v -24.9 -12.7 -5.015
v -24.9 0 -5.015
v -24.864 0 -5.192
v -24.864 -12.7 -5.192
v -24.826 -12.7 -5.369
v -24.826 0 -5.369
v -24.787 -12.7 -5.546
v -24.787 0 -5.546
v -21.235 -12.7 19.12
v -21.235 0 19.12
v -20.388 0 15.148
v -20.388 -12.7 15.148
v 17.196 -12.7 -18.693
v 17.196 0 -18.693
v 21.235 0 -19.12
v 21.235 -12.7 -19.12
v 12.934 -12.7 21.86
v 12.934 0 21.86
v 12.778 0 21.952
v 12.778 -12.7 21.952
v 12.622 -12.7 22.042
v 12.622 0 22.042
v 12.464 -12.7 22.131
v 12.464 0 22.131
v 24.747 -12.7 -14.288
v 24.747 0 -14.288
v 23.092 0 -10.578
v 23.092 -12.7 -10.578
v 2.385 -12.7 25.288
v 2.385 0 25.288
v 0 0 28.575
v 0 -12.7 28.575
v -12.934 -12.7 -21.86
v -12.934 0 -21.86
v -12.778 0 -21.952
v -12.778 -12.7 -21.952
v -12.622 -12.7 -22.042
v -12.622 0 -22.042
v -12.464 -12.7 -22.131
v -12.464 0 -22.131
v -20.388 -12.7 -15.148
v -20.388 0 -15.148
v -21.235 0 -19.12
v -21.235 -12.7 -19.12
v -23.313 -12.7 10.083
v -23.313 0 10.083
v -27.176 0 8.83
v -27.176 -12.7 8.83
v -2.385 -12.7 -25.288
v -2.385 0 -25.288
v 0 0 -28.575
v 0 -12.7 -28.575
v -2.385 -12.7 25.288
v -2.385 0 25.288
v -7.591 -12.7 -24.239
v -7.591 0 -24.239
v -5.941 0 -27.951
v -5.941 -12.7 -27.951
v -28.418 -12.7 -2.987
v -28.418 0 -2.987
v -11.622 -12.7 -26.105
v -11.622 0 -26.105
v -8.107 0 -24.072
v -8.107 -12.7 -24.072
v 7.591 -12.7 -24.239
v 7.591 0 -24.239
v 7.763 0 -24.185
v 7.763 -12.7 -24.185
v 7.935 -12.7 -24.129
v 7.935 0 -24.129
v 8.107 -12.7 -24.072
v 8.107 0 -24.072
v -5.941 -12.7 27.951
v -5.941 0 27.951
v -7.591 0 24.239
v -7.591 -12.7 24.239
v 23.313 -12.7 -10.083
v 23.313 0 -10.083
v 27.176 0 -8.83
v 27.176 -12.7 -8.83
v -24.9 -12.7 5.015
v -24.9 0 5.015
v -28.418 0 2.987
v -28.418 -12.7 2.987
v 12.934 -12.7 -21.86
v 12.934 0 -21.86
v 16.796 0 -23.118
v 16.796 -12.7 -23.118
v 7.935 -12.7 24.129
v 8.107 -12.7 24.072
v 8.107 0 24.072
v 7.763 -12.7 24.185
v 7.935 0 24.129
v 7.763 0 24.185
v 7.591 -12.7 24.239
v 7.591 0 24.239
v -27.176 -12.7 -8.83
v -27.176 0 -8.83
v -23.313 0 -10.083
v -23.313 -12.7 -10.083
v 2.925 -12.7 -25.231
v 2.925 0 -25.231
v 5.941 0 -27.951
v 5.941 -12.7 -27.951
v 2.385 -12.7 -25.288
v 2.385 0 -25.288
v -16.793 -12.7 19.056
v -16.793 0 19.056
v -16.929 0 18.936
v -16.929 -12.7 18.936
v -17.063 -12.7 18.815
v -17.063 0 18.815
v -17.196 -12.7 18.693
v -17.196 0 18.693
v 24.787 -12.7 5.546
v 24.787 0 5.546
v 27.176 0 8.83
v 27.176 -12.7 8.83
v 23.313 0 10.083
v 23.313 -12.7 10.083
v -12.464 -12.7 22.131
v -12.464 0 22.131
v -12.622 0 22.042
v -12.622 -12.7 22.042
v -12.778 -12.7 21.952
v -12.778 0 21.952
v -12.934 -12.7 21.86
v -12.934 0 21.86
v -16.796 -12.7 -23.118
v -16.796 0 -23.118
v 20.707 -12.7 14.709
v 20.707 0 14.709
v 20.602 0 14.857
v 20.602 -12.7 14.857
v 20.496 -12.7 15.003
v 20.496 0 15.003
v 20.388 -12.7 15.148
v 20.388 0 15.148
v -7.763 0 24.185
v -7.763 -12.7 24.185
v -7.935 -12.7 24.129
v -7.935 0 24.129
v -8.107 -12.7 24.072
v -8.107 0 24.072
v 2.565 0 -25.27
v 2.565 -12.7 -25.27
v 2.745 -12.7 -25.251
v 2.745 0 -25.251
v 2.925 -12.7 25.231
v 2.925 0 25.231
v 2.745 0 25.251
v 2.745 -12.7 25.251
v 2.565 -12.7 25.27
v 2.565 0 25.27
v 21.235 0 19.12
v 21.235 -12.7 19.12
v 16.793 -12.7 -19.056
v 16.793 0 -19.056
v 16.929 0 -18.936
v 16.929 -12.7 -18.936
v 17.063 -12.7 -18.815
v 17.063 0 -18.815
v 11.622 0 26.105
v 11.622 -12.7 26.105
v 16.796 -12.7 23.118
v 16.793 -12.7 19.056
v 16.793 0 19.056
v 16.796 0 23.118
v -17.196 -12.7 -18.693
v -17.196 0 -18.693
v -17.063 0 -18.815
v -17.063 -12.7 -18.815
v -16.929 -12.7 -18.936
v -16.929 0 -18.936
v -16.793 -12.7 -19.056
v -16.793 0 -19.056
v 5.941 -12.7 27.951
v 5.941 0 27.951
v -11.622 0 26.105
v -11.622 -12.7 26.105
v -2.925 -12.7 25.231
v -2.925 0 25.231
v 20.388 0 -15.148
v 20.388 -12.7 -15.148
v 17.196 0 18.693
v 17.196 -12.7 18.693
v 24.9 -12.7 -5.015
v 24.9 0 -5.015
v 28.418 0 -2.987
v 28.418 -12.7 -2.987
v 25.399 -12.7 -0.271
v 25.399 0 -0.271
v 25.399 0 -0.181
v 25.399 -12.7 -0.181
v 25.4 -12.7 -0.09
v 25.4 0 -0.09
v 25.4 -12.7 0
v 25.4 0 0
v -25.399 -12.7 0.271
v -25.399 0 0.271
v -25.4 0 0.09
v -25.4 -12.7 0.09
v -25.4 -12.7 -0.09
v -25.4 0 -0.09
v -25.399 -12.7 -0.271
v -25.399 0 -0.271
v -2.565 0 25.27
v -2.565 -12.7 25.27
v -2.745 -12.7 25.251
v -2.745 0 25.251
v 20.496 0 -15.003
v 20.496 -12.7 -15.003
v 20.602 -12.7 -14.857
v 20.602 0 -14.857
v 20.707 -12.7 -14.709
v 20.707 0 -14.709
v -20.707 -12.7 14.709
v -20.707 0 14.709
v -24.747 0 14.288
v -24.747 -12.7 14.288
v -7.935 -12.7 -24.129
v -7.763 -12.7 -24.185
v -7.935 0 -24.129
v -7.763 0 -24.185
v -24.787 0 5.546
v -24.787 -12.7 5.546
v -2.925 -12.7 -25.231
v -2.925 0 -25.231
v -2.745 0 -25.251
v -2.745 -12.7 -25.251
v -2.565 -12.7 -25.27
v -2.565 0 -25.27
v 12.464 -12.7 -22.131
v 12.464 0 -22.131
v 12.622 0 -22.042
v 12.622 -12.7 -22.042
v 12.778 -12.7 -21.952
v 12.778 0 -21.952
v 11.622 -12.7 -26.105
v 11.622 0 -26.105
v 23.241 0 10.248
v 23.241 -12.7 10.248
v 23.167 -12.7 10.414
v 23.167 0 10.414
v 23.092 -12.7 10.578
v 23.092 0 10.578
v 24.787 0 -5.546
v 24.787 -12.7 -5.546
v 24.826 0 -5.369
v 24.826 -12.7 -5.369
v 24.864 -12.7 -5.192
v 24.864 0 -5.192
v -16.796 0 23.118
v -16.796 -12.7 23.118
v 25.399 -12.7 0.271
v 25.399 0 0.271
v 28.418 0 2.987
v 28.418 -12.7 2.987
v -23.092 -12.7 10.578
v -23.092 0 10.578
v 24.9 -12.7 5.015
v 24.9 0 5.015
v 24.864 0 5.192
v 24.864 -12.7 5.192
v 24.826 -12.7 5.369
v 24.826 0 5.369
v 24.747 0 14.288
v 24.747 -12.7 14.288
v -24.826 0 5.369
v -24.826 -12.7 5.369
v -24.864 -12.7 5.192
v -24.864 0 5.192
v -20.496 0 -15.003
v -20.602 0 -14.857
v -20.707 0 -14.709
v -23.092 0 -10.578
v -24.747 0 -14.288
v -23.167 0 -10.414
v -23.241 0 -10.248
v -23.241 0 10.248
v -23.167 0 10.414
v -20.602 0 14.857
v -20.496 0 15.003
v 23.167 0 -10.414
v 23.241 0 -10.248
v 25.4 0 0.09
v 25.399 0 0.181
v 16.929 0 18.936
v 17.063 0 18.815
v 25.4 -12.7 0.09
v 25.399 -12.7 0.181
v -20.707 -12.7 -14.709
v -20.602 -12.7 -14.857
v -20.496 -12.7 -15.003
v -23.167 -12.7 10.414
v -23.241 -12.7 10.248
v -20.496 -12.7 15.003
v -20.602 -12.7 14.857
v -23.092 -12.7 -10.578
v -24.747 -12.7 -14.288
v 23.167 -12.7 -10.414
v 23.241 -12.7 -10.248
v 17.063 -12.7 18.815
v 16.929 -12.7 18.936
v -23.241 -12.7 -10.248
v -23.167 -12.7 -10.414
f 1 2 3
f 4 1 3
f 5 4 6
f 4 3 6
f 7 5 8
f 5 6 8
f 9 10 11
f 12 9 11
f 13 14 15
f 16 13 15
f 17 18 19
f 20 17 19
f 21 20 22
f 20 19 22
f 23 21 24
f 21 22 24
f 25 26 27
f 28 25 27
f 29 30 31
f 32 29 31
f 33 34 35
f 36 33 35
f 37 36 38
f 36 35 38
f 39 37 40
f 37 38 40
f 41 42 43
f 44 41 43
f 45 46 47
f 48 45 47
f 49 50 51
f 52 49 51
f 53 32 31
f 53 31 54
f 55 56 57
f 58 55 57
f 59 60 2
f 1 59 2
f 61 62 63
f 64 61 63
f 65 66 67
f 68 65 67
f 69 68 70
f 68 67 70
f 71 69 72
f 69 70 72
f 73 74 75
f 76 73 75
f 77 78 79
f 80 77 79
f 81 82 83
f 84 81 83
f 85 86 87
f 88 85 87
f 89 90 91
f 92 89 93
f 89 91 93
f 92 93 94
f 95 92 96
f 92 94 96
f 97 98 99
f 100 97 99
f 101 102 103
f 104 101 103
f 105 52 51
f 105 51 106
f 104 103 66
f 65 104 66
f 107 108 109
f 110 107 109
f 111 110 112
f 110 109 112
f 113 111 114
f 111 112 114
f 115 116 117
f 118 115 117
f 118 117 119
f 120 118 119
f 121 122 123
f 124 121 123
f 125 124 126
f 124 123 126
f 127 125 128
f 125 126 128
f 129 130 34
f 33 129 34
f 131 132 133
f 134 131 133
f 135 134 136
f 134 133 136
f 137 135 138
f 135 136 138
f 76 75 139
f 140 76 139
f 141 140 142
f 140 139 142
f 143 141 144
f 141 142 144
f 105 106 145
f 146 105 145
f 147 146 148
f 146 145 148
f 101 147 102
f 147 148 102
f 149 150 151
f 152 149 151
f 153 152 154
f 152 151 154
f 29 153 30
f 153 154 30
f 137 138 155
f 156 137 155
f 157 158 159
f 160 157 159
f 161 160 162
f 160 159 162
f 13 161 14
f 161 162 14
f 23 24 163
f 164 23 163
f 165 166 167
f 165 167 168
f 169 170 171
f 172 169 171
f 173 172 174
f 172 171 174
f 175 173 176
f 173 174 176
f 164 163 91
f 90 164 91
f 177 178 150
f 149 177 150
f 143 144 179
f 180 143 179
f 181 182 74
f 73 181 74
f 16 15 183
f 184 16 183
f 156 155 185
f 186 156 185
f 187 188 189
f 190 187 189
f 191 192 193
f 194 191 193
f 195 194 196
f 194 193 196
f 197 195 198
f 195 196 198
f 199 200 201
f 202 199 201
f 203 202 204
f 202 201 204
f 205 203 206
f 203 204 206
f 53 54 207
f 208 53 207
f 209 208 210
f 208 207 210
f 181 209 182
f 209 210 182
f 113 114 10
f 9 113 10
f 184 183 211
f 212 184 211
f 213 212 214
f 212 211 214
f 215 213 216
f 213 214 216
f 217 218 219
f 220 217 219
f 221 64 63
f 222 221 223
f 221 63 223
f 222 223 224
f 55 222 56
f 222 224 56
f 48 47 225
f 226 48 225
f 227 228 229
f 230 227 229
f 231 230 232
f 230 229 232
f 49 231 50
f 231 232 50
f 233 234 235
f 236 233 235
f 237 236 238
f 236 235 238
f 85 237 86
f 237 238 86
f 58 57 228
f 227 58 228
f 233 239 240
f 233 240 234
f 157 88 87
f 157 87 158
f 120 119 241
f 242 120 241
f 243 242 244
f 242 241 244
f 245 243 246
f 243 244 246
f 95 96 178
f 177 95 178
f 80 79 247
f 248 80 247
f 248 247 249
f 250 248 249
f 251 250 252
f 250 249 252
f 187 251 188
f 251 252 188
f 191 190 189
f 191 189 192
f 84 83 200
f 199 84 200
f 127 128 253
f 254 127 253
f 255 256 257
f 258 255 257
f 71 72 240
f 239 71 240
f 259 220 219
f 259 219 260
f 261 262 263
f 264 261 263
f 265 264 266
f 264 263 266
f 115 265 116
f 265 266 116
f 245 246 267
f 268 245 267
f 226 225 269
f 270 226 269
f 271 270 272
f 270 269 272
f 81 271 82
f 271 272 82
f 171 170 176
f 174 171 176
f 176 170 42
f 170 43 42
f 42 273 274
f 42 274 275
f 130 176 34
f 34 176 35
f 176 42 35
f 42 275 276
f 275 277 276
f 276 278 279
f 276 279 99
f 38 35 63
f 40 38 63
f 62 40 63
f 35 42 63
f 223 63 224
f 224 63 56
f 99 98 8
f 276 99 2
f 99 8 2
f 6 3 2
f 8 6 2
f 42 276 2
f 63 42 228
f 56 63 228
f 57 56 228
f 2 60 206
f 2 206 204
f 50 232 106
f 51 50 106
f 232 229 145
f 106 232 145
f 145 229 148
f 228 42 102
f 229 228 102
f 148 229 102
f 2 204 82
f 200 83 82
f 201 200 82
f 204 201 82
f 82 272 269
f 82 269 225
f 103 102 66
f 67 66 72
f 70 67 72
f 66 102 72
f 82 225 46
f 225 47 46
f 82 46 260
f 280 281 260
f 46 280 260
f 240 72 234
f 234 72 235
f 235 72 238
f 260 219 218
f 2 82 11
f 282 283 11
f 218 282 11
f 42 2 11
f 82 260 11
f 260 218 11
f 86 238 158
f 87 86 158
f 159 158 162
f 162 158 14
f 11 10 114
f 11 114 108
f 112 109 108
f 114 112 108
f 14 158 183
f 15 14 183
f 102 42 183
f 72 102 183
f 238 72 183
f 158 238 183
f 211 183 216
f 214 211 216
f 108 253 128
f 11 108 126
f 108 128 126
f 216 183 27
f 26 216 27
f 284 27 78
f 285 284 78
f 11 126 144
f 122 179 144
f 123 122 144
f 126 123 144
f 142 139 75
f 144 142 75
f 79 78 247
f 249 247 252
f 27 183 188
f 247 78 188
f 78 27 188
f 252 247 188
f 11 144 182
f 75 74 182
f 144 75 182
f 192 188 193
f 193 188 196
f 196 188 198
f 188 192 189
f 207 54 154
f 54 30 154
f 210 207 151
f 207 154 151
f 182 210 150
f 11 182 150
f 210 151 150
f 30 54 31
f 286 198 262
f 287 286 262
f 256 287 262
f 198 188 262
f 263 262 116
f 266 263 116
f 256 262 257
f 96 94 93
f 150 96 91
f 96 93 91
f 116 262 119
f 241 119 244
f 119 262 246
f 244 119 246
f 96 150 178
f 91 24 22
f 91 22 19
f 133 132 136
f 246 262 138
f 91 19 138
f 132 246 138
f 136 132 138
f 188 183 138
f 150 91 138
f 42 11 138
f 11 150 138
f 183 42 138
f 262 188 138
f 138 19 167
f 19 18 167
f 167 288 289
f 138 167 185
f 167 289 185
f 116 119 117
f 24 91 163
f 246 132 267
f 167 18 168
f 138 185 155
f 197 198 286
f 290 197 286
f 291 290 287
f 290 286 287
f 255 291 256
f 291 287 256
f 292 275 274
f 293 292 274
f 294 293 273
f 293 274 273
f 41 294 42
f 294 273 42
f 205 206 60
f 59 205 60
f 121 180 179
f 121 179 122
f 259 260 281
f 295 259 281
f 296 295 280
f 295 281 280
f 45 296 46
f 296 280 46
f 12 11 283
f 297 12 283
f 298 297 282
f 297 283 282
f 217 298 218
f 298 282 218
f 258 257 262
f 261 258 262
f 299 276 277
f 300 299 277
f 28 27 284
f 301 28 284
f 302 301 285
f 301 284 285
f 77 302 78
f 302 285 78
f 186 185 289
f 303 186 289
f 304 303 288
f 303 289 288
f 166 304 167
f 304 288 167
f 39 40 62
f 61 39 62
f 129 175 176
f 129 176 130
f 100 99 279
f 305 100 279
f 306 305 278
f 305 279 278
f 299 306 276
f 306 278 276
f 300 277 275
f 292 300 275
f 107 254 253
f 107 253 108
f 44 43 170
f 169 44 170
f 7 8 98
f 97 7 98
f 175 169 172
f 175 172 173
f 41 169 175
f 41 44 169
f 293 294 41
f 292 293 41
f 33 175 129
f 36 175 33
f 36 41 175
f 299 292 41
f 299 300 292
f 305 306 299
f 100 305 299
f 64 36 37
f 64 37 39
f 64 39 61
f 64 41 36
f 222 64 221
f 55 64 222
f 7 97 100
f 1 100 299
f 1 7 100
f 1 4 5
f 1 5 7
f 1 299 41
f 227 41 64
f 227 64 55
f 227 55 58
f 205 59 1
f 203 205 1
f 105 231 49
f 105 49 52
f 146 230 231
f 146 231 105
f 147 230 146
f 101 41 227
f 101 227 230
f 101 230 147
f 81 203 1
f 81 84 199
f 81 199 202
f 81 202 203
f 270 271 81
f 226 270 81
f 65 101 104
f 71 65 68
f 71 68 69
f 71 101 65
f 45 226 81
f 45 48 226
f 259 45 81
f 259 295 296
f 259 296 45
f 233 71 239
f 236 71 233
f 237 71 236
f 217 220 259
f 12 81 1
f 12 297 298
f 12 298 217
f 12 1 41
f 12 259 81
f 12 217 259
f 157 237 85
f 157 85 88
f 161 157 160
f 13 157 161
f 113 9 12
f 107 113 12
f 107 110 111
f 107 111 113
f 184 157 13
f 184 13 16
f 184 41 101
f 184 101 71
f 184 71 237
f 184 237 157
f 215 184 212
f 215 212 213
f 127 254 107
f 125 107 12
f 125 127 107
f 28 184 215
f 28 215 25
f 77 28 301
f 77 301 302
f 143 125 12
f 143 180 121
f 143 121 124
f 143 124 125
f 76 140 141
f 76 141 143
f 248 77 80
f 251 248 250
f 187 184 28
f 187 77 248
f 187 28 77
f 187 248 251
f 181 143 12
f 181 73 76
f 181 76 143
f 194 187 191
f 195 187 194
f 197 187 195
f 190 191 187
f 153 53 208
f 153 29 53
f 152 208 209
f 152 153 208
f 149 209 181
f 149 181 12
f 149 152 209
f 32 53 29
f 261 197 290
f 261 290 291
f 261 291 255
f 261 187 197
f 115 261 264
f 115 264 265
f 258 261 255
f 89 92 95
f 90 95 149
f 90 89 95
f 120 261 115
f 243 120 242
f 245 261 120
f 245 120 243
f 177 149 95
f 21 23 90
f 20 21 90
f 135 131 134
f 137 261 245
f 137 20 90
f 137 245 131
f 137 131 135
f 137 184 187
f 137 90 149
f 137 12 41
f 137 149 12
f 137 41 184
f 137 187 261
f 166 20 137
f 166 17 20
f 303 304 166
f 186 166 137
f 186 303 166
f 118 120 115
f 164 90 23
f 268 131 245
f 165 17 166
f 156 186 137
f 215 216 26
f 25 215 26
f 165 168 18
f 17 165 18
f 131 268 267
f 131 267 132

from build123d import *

# Parameters (mm, degrees)
F1_DEPTH = 12.7


with BuildPart() as f1:
    # F0 (on Front) → F1 (new body)
    with BuildSketch(Plane.XZ):
        with BuildLine():
            ThreePointArc((25.398552, -0.271215), (25.399638, -0.135609), (25.4, 0))
            ThreePointArc((25.4, 0), (25.399638, 0.135609), (25.398552, 0.271215))
            ThreePointArc((25.398552, 0.271215), (25.260856, 2.655023), (24.899921, 5.015368))
            ThreePointArc((24.899921, 5.015368), (24.844949, 5.280957), (24.787144, 5.545944))
            ThreePointArc((24.787144, 5.545944), (24.156836, 7.849032), (23.313045, 10.082755))
            ThreePointArc((23.313045, 10.082755), (23.204055, 10.331111), (23.092419, 10.578289))
            ThreePointArc((23.092419, 10.578289), (21.997045, 12.7), (20.707276, 14.709477))
            ThreePointArc((20.707276, 14.709477), (20.549032, 14.929745), (20.388444, 15.148311))
            ThreePointArc((20.388444, 15.148311), (18.875879, 16.995917), (17.1965, 18.693325))
            ThreePointArc((17.1965, 18.693325), (16.995917, 18.875879), (16.793397, 19.05628))
            ThreePointArc((16.793397, 19.05628), (14.929745, 20.549032), (12.934155, 21.860184))
            ThreePointArc((12.934155, 21.860184), (12.7, 21.997045), (12.464397, 22.131399))
            ThreePointArc((12.464397, 22.131399), (10.331111, 23.204055), (8.106525, 24.071648))
            ThreePointArc((8.106525, 24.071648), (7.849032, 24.156836), (7.590644, 24.239268))
            ThreePointArc((7.590644, 24.239268), (5.280957, 24.844949), (2.9246, 25.231066))
            ThreePointArc((2.9246, 25.231066), (2.655023, 25.260856), (2.385143, 25.287766))
            ThreePointArc((2.385143, 25.287766), (1.193891, 25.371926), (0, 25.4))
            ThreePointArc((0, 25.4), (-1.193891, 25.371926), (-2.385143, 25.287766))
            ThreePointArc((-2.385143, 25.287766), (-2.655023, 25.260856), (-2.9246, 25.231066))
            ThreePointArc((-2.9246, 25.231066), (-5.280957, 24.844949), (-7.590644, 24.239268))
            ThreePointArc((-7.590644, 24.239268), (-7.849032, 24.156836), (-8.106525, 24.071648))
            ThreePointArc((-8.106525, 24.071648), (-10.331111, 23.204055), (-12.464397, 22.131399))
            ThreePointArc((-12.464397, 22.131399), (-12.7, 21.997045), (-12.934155, 21.860184))
            ThreePointArc((-12.934155, 21.860184), (-14.929745, 20.549032), (-16.793397, 19.05628))
            ThreePointArc((-16.793397, 19.05628), (-16.995917, 18.875879), (-17.1965, 18.693325))
            ThreePointArc((-17.1965, 18.693325), (-18.875879, 16.995917), (-20.388444, 15.148311))
            ThreePointArc((-20.388444, 15.148311), (-20.549032, 14.929745), (-20.707276, 14.709477))
            ThreePointArc((-20.707276, 14.709477), (-21.997045, 12.7), (-23.092419, 10.578289))
            ThreePointArc((-23.092419, 10.578289), (-23.204055, 10.331111), (-23.313045, 10.082755))
            ThreePointArc((-23.313045, 10.082755), (-24.156836, 7.849032), (-24.787144, 5.545944))
            ThreePointArc((-24.787144, 5.545944), (-24.844949, 5.280957), (-24.899921, 5.015368))
            ThreePointArc((-24.899921, 5.015368), (-25.260856, 2.655023), (-25.398552, 0.271215))
            ThreePointArc((-25.398552, 0.271215), (-25.4, 0), (-25.398552, -0.271215))
            ThreePointArc((-25.398552, -0.271215), (-25.260856, -2.655023), (-24.899921, -5.015368))
            ThreePointArc((-24.899921, -5.015368), (-24.844949, -5.280957), (-24.787144, -5.545944))
            ThreePointArc((-24.787144, -5.545944), (-24.156836, -7.849032), (-23.313045, -10.082755))
            ThreePointArc((-23.313045, -10.082755), (-23.204055, -10.331111), (-23.092419, -10.578289))
            ThreePointArc((-23.092419, -10.578289), (-21.997045, -12.7), (-20.707276, -14.709477))
            ThreePointArc((-20.707276, -14.709477), (-20.549032, -14.929745), (-20.388444, -15.148311))
            ThreePointArc((-20.388444, -15.148311), (-18.875879, -16.995917), (-17.1965, -18.693325))
            ThreePointArc((-17.1965, -18.693325), (-16.995917, -18.875879), (-16.793397, -19.05628))
            ThreePointArc((-16.793397, -19.05628), (-14.929745, -20.549032), (-12.934155, -21.860184))
            ThreePointArc((-12.934155, -21.860184), (-12.7, -21.997045), (-12.464397, -22.131399))
            ThreePointArc((-12.464397, -22.131399), (-10.331111, -23.204055), (-8.106525, -24.071648))
            ThreePointArc((-8.106525, -24.071648), (-7.849032, -24.156836), (-7.590644, -24.239268))
            ThreePointArc((-7.590644, -24.239268), (-5.280957, -24.844949), (-2.9246, -25.231066))
            ThreePointArc((-2.9246, -25.231066), (-2.655023, -25.260856), (-2.385143, -25.287766))
            ThreePointArc((-2.385143, -25.287766), (0, -25.4), (2.385143, -25.287766))
            ThreePointArc((2.385143, -25.287766), (2.655023, -25.260856), (2.9246, -25.231066))
            ThreePointArc((2.9246, -25.231066), (5.280957, -24.844949), (7.590644, -24.239268))
            ThreePointArc((7.590644, -24.239268), (7.849032, -24.156836), (8.106525, -24.071648))
            ThreePointArc((8.106525, -24.071648), (10.331111, -23.204055), (12.464397, -22.131399))
            ThreePointArc((12.464397, -22.131399), (12.7, -21.997045), (12.934155, -21.860184))
            ThreePointArc((12.934155, -21.860184), (14.929745, -20.549032), (16.793397, -19.05628))
            ThreePointArc((16.793397, -19.05628), (16.995917, -18.875879), (17.1965, -18.693325))
            ThreePointArc((17.1965, -18.693325), (18.875879, -16.995917), (20.388444, -15.148311))
            ThreePointArc((20.388444, -15.148311), (20.549032, -14.929745), (20.707276, -14.709477))
            ThreePointArc((20.707276, -14.709477), (21.997045, -12.7), (23.092419, -10.578289))
            ThreePointArc((23.092419, -10.578289), (23.204055, -10.331111), (23.313045, -10.082755))
            ThreePointArc((23.313045, -10.082755), (24.156836, -7.849032), (24.787144, -5.545944))
            ThreePointArc((24.787144, -5.545944), (24.844949, -5.280957), (24.899921, -5.015368))
            ThreePointArc((24.899921, -5.015368), (25.260856, -2.655023), (25.398552, -0.271215))
        make_face()
        with BuildLine():
            ThreePointArc((24.899921, 5.015368), (25.260856, 2.655023), (25.398552, 0.271215))
            Line((25.398552, 0.271215), (28.418463, 2.986901))
            Line((28.418463, 2.986901), (24.899921, 5.015368))
        make_face()
        with BuildLine():
            Line((28.418463, -2.986901), (25.398552, -0.271215))
            ThreePointArc((25.398552, -0.271215), (25.260856, -2.655023), (24.899921, -5.015368))
            Line((24.899921, -5.015368), (28.418463, -2.986901))
        make_face()
        with BuildLine():
            ThreePointArc((23.313045, 10.082755), (24.156836, 7.849032), (24.787144, 5.545944))
            Line((24.787144, 5.545944), (27.17644, 8.830161))
            Line((27.17644, 8.830161), (23.313045, 10.082755))
        make_face()
        with BuildLine():
            Line((27.17644, -8.830161), (24.787144, -5.545944))
            ThreePointArc((24.787144, -5.545944), (24.156836, -7.849032), (23.313045, -10.082755))
            Line((23.313045, -10.082755), (27.17644, -8.830161))
        make_face()
        with BuildLine():
            ThreePointArc((20.707276, 14.709477), (21.997045, 12.7), (23.092419, 10.578289))
            Line((23.092419, 10.578289), (24.746676, 14.2875))
            Line((24.746676, 14.2875), (20.707276, 14.709477))
        make_face()
        with BuildLine():
            Line((24.746676, -14.2875), (23.092419, -10.578289))
            ThreePointArc((23.092419, -10.578289), (21.997045, -12.7), (20.707276, -14.709477))
            Line((20.707276, -14.709477), (24.746676, -14.2875))
        make_face()
        with BuildLine():
            ThreePointArc((17.1965, 18.693325), (18.875879, 16.995917), (20.388444, 15.148311))
            Line((20.388444, 15.148311), (21.235363, 19.120407))
            Line((21.235363, 19.120407), (17.1965, 18.693325))
        make_face()
        with BuildLine():
            Line((21.235363, -19.120407), (20.388444, -15.148311))
            ThreePointArc((20.388444, -15.148311), (18.875879, -16.995917), (17.1965, -18.693325))
            Line((17.1965, -18.693325), (21.235363, -19.120407))
        make_face()
        with BuildLine():
            ThreePointArc((12.934155, 21.860184), (14.929745, 20.549032), (16.793397, 19.05628))
            Line((16.793397, 19.05628), (16.795964, 23.117661))
            Line((16.795964, 23.117661), (12.934155, 21.860184))
        make_face()
        with BuildLine():
            Line((16.795964, -23.117661), (16.793397, -19.05628))
            ThreePointArc((16.793397, -19.05628), (14.929745, -20.549032), (12.934155, -21.860184))
            Line((12.934155, -21.860184), (16.795964, -23.117661))
        make_face()
        with BuildLine():
            ThreePointArc((8.106525, 24.071648), (10.331111, 23.204055), (12.464397, 22.131399))
            Line((12.464397, 22.131399), (11.6225, 26.104561))
            Line((11.6225, 26.104561), (8.106525, 24.071648))
        make_face()
        with BuildLine():
            Line((11.6225, -26.104561), (12.464397, -22.131399))
            ThreePointArc((12.464397, -22.131399), (10.331111, -23.204055), (8.106525, -24.071648))
            Line((8.106525, -24.071648), (11.6225, -26.104561))
        make_face()
        with BuildLine():
            ThreePointArc((2.9246, 25.231066), (5.280957, 24.844949), (7.590644, 24.239268))
            Line((7.590644, 24.239268), (5.941077, 27.950568))
            Line((5.941077, 27.950568), (2.9246, 25.231066))
        make_face()
        with BuildLine():
            Line((5.941077, -27.950568), (7.590644, -24.239268))
            ThreePointArc((7.590644, -24.239268), (5.280957, -24.844949), (2.9246, -25.231066))
            Line((2.9246, -25.231066), (5.941077, -27.950568))
        make_face()
        with BuildLine():
            ThreePointArc((0, 25.4), (1.193891, 25.371926), (2.385143, 25.287766))
            Line((2.385143, 25.287766), (0, 28.575))
            Line((0, 28.575), (0, 25.4))
        make_face()
        with BuildLine():
            Line((0, -28.575), (2.385143, -25.287766))
            ThreePointArc((2.385143, -25.287766), (0, -25.4), (-2.385143, -25.287766))
            Line((-2.385143, -25.287766), (0, -28.575))
        make_face()
        with BuildLine():
            ThreePointArc((-2.385143, 25.287766), (-1.193891, 25.371926), (0, 25.4))
            Line((0, 25.4), (0, 28.575))
            Line((0, 28.575), (-2.385143, 25.287766))
        make_face()
        with BuildLine():
            Line((-5.941077, -27.950568), (-2.9246, -25.231066))
            ThreePointArc((-2.9246, -25.231066), (-5.280957, -24.844949), (-7.590644, -24.239268))
            Line((-7.590644, -24.239268), (-5.941077, -27.950568))
        make_face()
        with BuildLine():
            ThreePointArc((-7.590644, 24.239268), (-5.280957, 24.844949), (-2.9246, 25.231066))
            Line((-2.9246, 25.231066), (-5.941077, 27.950568))
            Line((-5.941077, 27.950568), (-7.590644, 24.239268))
        make_face()
        with BuildLine():
            Line((-11.6225, -26.104561), (-8.106525, -24.071648))
            ThreePointArc((-8.106525, -24.071648), (-10.331111, -23.204055), (-12.464397, -22.131399))
            Line((-12.464397, -22.131399), (-11.6225, -26.104561))
        make_face()
        with BuildLine():
            ThreePointArc((-12.464397, 22.131399), (-10.331111, 23.204055), (-8.106525, 24.071648))
            Line((-8.106525, 24.071648), (-11.6225, 26.104561))
            Line((-11.6225, 26.104561), (-12.464397, 22.131399))
        make_face()
        with BuildLine():
            Line((-16.795964, -23.117661), (-12.934155, -21.860184))
            ThreePointArc((-12.934155, -21.860184), (-14.929745, -20.549032), (-16.793397, -19.05628))
            Line((-16.793397, -19.05628), (-16.795964, -23.117661))
        make_face()
        with BuildLine():
            ThreePointArc((-16.793397, 19.05628), (-14.929745, 20.549032), (-12.934155, 21.860184))
            Line((-12.934155, 21.860184), (-16.795964, 23.117661))
            Line((-16.795964, 23.117661), (-16.793397, 19.05628))
        make_face()
        with BuildLine():
            Line((-21.235363, -19.120407), (-17.1965, -18.693325))
            ThreePointArc((-17.1965, -18.693325), (-18.875879, -16.995917), (-20.388444, -15.148311))
            Line((-20.388444, -15.148311), (-21.235363, -19.120407))
        make_face()
        with BuildLine():
            ThreePointArc((-20.388444, 15.148311), (-18.875879, 16.995917), (-17.1965, 18.693325))
            Line((-17.1965, 18.693325), (-21.235363, 19.120407))
            Line((-21.235363, 19.120407), (-20.388444, 15.148311))
        make_face()
        with BuildLine():
            Line((-24.746676, -14.2875), (-20.707276, -14.709477))
            ThreePointArc((-20.707276, -14.709477), (-21.997045, -12.7), (-23.092419, -10.578289))
            Line((-23.092419, -10.578289), (-24.746676, -14.2875))
        make_face()
        with BuildLine():
            ThreePointArc((-23.092419, 10.578289), (-21.997045, 12.7), (-20.707276, 14.709477))
            Line((-20.707276, 14.709477), (-24.746676, 14.2875))
            Line((-24.746676, 14.2875), (-23.092419, 10.578289))
        make_face()
        with BuildLine():
            Line((-27.17644, -8.830161), (-23.313045, -10.082755))
            ThreePointArc((-23.313045, -10.082755), (-24.156836, -7.849032), (-24.787144, -5.545944))
            Line((-24.787144, -5.545944), (-27.17644, -8.830161))
        make_face()
        with BuildLine():
            ThreePointArc((-24.787144, 5.545944), (-24.156836, 7.849032), (-23.313045, 10.082755))
            Line((-23.313045, 10.082755), (-27.17644, 8.830161))
            Line((-27.17644, 8.830161), (-24.787144, 5.545944))
        make_face()
        with BuildLine():
            Line((-28.418463, -2.986901), (-24.899921, -5.015368))
            ThreePointArc((-24.899921, -5.015368), (-25.260856, -2.655023), (-25.398552, -0.271215))
            Line((-25.398552, -0.271215), (-28.418463, -2.986901))
        make_face()
        with BuildLine():
            ThreePointArc((-25.398552, 0.271215), (-25.260856, 2.655023), (-24.899921, 5.015368))
            Line((-24.899921, 5.015368), (-28.418463, 2.986901))
            Line((-28.418463, 2.986901), (-25.398552, 0.271215))
        make_face()
    extrude(amount=F1_DEPTH)


solid = f1.part
